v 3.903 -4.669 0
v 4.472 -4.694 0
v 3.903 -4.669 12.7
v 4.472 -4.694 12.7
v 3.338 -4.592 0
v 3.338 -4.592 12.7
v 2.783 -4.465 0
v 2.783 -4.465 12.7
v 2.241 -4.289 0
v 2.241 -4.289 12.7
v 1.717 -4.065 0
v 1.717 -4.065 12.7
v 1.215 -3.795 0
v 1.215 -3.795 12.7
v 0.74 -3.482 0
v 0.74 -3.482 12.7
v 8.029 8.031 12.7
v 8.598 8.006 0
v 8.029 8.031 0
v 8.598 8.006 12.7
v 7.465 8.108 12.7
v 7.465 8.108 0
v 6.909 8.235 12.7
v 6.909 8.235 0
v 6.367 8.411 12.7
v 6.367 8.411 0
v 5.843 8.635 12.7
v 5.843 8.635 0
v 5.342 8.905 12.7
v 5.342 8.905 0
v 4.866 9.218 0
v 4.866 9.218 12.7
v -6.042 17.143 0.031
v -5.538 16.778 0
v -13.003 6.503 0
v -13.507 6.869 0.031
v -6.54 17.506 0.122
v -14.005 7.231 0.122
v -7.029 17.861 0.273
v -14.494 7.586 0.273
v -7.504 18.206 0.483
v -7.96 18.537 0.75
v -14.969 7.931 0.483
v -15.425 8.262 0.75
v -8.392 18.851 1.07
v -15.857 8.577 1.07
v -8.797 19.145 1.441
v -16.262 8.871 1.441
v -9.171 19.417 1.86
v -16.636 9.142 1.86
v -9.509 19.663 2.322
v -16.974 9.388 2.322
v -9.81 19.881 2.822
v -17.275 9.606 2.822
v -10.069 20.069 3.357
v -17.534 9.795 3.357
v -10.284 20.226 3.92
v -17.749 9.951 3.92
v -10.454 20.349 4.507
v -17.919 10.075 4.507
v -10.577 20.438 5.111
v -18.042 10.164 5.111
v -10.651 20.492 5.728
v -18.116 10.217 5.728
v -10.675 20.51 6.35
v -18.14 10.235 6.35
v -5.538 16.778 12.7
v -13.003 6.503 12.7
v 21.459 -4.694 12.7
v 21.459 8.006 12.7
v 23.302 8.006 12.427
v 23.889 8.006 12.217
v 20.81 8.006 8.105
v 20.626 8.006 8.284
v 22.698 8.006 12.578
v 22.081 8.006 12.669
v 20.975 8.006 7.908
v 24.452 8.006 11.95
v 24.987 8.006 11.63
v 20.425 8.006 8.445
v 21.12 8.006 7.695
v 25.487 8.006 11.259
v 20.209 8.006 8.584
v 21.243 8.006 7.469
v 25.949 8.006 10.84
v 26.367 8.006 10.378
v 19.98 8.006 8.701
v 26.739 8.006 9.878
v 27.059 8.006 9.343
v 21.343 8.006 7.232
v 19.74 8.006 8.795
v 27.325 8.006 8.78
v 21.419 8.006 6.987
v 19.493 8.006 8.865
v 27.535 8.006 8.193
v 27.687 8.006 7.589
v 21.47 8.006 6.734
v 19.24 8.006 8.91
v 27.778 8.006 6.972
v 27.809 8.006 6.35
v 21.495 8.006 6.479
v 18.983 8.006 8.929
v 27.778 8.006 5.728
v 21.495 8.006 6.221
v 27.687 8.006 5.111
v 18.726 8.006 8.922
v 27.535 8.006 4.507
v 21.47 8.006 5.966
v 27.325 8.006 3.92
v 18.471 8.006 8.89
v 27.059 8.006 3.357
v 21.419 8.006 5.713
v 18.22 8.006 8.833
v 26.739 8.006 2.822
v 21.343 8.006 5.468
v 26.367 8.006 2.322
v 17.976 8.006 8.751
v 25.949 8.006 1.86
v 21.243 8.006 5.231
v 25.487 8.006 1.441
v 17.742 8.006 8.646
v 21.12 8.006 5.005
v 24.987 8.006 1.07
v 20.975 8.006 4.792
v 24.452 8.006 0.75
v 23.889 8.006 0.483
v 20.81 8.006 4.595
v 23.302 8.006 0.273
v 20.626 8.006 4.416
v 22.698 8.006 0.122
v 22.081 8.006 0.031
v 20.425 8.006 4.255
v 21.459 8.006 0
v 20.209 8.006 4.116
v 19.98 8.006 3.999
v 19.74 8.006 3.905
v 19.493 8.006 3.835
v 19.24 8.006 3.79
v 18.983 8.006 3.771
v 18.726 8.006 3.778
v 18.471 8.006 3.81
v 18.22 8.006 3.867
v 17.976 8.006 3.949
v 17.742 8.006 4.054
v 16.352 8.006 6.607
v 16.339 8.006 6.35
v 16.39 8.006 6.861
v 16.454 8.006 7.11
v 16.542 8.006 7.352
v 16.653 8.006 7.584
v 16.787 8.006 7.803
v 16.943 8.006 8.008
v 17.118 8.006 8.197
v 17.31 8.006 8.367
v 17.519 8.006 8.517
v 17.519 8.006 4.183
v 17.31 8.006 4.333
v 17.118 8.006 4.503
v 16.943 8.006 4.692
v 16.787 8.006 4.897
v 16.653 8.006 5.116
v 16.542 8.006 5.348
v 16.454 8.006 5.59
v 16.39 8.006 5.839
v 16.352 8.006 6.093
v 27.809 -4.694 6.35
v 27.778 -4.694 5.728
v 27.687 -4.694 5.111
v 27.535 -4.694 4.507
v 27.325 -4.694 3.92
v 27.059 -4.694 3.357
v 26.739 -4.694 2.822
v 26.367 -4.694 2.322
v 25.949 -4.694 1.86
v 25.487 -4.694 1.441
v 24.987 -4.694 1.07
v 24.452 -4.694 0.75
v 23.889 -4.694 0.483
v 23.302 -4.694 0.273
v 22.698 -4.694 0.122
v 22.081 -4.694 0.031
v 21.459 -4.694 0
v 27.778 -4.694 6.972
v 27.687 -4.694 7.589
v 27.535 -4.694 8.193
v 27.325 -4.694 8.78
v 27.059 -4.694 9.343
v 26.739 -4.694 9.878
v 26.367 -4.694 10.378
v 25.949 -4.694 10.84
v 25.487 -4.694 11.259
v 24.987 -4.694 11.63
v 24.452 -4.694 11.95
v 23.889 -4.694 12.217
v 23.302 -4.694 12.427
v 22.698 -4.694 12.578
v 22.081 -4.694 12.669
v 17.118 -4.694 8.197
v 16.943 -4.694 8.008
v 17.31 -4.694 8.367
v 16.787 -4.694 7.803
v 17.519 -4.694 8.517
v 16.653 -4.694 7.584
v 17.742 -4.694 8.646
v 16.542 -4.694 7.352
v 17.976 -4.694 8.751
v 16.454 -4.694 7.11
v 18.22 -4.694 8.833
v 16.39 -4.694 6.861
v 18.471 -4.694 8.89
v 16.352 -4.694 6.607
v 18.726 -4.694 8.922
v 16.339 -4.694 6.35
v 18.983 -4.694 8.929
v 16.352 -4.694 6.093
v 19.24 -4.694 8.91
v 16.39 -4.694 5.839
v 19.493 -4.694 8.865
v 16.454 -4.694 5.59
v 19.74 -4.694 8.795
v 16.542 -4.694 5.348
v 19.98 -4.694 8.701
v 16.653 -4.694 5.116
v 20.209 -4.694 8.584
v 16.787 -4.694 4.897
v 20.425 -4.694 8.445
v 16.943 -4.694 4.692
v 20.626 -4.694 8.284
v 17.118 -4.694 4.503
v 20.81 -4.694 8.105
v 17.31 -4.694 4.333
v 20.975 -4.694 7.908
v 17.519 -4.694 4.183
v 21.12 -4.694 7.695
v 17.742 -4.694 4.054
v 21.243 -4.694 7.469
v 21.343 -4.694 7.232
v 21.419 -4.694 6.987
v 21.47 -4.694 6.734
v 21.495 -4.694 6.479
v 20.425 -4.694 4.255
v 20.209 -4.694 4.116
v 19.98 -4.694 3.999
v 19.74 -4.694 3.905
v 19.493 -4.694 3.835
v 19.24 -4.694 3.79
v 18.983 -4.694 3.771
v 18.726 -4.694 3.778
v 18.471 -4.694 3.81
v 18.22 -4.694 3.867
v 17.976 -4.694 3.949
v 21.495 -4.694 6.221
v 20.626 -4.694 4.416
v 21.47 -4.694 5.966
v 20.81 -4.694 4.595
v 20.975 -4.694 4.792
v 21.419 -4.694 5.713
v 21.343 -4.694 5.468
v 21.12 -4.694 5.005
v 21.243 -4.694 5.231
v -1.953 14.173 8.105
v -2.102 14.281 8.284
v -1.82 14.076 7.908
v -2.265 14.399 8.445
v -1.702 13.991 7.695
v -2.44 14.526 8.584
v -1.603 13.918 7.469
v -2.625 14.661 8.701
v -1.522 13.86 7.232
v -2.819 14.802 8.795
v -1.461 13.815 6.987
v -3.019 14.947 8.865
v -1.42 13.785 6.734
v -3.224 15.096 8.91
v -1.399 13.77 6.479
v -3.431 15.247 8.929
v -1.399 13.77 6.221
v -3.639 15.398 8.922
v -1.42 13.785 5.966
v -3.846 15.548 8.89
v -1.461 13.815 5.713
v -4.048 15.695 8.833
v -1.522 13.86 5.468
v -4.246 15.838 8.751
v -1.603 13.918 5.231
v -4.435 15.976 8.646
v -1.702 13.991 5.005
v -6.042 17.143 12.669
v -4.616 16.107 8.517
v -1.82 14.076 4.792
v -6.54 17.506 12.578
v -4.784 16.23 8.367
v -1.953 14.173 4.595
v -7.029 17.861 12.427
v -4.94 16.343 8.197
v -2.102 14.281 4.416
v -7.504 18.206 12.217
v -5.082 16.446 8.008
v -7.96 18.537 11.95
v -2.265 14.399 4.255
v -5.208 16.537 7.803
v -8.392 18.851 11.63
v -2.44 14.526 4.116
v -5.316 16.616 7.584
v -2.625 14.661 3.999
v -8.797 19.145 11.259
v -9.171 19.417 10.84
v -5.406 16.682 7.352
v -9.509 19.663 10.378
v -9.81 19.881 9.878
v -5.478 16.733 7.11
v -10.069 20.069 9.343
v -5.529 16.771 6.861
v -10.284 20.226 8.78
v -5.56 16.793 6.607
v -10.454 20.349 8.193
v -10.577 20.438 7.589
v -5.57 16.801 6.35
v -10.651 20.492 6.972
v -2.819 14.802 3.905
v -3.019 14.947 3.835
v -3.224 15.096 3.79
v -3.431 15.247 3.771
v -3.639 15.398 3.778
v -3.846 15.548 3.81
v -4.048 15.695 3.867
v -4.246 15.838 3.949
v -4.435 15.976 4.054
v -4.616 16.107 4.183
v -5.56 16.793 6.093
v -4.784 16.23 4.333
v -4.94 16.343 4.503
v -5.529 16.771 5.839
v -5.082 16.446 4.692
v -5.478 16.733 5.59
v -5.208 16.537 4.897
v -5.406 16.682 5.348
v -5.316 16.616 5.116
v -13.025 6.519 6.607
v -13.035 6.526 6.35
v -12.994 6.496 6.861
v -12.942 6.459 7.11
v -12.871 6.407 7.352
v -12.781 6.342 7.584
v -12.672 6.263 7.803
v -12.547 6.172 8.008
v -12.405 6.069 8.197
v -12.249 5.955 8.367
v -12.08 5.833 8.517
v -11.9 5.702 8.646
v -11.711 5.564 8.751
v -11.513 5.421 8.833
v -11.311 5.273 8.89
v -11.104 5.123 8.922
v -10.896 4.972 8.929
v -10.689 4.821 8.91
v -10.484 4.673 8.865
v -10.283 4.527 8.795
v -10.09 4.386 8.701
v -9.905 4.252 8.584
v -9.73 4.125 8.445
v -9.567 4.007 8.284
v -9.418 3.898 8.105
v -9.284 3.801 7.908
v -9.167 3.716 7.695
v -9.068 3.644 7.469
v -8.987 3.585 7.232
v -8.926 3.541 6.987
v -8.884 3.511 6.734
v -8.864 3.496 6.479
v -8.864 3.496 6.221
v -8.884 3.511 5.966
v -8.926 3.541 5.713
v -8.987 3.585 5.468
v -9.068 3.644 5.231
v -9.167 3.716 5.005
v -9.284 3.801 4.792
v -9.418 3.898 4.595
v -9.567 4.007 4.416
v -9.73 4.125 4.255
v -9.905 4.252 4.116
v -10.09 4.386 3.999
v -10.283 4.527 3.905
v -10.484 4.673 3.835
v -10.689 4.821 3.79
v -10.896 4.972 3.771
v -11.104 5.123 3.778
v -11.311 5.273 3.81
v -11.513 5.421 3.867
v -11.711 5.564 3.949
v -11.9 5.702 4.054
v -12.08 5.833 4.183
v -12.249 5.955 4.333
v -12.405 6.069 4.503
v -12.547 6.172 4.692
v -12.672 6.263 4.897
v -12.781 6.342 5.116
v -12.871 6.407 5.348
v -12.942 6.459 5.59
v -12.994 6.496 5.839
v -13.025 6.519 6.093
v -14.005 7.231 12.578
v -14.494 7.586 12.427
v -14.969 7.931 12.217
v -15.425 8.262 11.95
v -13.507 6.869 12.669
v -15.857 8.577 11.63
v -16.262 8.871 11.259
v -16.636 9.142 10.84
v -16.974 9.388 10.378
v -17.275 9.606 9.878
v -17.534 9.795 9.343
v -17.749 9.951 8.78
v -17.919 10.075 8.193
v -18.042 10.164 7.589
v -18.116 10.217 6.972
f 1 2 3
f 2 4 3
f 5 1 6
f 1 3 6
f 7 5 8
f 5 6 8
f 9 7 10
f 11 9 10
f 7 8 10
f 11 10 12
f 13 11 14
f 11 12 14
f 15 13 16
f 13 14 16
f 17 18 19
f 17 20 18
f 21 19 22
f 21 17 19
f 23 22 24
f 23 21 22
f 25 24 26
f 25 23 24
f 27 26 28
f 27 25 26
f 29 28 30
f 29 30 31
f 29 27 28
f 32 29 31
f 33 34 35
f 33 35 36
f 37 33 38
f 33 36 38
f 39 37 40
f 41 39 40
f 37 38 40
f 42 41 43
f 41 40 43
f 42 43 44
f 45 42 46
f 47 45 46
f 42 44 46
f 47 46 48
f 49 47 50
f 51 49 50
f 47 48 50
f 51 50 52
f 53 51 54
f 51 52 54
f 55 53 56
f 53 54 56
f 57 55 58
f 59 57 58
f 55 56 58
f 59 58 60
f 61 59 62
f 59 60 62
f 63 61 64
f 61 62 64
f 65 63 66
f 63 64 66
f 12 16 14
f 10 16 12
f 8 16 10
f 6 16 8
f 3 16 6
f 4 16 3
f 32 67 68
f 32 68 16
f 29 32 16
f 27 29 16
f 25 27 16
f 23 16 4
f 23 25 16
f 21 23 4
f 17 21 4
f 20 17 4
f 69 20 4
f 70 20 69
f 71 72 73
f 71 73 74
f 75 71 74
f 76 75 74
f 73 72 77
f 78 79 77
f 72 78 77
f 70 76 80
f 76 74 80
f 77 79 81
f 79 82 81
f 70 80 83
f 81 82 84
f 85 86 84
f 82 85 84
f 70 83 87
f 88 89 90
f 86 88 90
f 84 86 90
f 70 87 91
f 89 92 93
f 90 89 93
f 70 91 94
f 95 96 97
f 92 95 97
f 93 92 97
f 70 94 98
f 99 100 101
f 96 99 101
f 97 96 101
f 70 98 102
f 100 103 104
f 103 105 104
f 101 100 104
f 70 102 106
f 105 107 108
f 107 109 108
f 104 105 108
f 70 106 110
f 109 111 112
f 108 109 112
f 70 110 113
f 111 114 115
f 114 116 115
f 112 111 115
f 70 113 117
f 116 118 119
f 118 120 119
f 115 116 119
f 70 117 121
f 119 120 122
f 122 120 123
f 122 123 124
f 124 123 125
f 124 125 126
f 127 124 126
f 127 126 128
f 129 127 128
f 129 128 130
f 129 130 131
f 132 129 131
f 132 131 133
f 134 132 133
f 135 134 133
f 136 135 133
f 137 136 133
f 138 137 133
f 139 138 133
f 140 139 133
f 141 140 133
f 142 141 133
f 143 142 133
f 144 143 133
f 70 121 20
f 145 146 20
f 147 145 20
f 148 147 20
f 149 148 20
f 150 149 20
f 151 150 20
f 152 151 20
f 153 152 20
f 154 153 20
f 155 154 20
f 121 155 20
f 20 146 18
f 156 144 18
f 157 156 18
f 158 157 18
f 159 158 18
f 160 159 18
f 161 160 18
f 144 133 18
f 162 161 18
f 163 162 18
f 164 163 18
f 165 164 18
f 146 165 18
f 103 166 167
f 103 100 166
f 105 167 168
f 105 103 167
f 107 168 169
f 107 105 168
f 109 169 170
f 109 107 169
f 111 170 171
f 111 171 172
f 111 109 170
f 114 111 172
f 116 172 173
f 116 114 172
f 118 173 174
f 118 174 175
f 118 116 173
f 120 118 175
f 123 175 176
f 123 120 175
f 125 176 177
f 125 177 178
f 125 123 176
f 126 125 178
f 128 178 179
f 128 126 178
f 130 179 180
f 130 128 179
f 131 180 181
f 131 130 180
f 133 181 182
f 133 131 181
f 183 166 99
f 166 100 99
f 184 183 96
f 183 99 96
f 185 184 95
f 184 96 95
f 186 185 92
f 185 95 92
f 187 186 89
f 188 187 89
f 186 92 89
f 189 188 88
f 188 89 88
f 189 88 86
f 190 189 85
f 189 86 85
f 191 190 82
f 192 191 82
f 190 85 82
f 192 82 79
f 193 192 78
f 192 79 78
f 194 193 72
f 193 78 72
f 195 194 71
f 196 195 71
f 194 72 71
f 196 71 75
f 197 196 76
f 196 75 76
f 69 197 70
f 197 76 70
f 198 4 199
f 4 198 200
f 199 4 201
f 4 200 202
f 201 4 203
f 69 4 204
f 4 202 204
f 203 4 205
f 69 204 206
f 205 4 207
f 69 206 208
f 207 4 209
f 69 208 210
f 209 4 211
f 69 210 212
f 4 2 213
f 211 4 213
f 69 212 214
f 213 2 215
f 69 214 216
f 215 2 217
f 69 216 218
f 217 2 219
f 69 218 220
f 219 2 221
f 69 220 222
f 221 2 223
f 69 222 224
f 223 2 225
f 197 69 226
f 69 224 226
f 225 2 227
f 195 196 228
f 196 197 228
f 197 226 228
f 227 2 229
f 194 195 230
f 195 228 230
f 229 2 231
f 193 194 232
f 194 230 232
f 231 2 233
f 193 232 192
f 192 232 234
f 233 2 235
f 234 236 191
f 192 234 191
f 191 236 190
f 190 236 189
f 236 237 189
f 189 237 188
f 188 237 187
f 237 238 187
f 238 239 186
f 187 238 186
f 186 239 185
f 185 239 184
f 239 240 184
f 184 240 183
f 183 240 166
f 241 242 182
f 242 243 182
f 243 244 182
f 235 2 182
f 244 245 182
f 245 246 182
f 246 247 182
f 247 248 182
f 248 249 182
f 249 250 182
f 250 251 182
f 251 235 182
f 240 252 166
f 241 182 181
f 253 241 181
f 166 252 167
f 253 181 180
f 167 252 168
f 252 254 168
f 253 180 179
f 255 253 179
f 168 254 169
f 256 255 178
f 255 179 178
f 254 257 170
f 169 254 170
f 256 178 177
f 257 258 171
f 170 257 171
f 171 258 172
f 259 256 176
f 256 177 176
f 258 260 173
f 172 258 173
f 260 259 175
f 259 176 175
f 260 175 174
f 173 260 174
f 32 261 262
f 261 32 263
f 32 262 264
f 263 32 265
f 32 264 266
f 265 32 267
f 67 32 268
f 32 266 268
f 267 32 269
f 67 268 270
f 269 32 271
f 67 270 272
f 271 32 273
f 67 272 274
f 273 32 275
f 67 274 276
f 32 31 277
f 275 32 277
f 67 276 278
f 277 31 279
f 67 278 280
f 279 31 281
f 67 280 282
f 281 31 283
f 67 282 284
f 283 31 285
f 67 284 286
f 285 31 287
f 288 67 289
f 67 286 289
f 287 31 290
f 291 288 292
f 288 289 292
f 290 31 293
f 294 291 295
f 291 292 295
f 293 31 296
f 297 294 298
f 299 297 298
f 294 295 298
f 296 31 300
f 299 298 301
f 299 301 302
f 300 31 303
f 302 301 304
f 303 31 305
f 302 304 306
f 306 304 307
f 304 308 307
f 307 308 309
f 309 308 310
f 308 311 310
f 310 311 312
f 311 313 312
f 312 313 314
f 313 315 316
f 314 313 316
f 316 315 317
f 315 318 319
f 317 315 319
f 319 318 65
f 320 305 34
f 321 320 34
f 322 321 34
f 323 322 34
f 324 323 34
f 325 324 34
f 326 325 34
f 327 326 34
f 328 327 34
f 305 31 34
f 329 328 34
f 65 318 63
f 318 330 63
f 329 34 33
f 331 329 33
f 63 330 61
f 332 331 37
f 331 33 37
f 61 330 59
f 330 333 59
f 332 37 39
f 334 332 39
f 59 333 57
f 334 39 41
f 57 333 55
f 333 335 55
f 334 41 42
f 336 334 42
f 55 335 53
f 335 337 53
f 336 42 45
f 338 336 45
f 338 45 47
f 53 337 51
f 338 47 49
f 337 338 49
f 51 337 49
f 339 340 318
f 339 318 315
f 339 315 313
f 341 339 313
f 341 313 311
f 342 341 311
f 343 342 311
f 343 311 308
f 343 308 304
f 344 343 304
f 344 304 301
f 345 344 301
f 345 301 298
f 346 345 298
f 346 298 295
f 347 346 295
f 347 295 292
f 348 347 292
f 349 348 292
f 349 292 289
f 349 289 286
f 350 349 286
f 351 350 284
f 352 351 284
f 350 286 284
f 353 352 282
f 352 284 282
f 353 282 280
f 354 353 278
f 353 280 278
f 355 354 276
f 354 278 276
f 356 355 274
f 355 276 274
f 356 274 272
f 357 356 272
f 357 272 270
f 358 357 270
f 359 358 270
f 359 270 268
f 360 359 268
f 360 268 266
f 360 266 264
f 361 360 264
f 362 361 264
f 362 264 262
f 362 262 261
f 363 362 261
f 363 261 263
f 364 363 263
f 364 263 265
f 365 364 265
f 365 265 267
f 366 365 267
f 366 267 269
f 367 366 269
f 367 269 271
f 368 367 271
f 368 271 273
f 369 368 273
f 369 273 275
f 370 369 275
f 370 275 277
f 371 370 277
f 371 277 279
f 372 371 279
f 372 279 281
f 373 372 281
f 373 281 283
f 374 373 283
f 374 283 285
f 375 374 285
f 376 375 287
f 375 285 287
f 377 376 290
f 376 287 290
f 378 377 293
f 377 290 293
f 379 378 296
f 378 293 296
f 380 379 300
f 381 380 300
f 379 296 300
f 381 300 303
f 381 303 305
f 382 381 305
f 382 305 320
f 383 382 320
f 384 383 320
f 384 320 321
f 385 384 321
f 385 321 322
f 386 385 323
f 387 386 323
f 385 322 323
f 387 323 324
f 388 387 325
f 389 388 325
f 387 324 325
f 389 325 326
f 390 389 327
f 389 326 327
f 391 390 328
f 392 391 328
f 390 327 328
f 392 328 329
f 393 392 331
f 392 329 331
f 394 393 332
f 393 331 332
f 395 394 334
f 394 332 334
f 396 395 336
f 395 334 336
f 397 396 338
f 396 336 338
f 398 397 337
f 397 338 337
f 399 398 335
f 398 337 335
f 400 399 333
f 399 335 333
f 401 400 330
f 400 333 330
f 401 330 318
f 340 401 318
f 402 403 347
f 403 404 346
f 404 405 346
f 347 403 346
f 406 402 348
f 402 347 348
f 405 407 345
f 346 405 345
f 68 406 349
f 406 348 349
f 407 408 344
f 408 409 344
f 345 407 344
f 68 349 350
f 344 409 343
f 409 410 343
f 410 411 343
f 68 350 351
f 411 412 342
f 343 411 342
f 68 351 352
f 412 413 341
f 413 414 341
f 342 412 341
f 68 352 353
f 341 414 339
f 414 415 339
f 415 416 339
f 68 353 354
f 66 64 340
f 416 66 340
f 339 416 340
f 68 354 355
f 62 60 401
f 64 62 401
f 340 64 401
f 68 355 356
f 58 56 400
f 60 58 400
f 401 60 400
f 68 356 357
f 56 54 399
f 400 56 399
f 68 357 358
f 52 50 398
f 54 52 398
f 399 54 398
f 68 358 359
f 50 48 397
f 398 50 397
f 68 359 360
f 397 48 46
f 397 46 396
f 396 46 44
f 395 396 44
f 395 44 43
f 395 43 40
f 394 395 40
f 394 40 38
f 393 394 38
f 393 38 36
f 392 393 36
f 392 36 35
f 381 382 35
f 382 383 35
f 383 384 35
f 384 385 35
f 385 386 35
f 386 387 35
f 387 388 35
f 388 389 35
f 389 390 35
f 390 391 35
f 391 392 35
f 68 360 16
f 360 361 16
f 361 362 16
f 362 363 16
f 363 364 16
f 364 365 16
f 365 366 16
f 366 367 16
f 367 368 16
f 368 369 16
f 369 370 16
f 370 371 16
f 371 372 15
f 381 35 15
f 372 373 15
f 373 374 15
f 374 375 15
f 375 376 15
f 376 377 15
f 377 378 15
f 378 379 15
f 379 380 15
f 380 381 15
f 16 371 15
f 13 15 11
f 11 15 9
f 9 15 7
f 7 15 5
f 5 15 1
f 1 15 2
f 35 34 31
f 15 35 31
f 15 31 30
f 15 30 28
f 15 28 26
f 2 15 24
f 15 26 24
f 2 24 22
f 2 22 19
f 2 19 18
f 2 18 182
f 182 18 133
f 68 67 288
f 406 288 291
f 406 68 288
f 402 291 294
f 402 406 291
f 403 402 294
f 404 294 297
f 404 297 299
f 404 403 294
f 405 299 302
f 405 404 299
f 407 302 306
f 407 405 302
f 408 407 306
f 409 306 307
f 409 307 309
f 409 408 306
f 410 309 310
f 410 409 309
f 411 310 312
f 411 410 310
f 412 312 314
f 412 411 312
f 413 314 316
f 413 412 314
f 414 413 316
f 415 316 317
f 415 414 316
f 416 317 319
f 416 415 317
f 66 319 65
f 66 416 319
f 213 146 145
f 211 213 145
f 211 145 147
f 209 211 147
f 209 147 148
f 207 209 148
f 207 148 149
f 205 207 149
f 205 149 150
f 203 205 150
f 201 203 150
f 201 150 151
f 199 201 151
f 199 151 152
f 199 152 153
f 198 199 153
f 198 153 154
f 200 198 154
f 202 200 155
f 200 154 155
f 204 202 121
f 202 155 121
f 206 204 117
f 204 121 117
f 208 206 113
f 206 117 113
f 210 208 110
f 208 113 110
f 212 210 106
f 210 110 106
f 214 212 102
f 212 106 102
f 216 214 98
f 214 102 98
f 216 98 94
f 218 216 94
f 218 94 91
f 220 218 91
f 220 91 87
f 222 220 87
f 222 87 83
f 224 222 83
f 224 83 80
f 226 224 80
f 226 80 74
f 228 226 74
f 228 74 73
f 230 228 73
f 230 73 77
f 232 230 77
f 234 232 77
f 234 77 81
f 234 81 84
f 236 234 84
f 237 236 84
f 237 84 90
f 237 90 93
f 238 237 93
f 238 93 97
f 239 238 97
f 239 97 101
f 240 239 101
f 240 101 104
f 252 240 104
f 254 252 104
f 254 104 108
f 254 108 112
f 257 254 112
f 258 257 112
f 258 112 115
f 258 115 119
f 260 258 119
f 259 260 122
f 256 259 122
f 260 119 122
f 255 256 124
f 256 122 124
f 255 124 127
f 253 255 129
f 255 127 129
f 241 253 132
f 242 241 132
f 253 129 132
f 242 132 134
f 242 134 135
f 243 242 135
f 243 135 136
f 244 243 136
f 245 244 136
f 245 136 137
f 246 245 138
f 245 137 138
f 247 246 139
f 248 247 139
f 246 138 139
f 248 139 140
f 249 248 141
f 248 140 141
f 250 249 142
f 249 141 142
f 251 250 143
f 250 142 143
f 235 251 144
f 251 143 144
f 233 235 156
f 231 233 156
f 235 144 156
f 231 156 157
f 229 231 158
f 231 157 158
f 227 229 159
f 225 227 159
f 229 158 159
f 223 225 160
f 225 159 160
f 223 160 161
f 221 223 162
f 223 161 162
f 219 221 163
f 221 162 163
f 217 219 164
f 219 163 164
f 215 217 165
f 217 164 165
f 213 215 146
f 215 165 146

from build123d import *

# Parameters (mm, degrees)
BOSS_EXTRUDE1_DEPTH = 12.7
SKETCH2_R           = 2.5796875
CUT_EXTRUDE1_DEPTH  = 26.162
SKETCH3_R           = 2.5796875
CUT_EXTRUDE2_DEPTH  = 26.162
FILLET1_R           = 6.35
FILLET2_R           = 6.35


with BuildPart() as part:
    # Sketch1 → Boss-Extrude1 (new body)
    with BuildSketch(Plane.XY):
        Polygon((27.808756526, 8.005672944), (6.535236668, 8.005672944), (-10.675402427, 20.509934181), (-18.140275131, 10.235418352), (2.408756526, -4.694327056), (27.808756526, -4.694327056), align=None)
    extrude(amount=BOSS_EXTRUDE1_DEPTH)

    # Sketch2 → Cut-Extrude1 (cut)
    with BuildSketch(Plane(origin=(0, 8.005672944, 0), x_dir=(1, 0, 0), z_dir=(0, 1, 0))):
        with Locations(Location((18.918756526, -6.35, 0), (0, 0, 180))):
            Circle(SKETCH2_R)
    extrude(amount=-CUT_EXTRUDE1_DEPTH, mode=Mode.SUBTRACT)

    # Sketch3 → Cut-Extrude2 (cut)
    with BuildSketch(Plane(origin=(6.064792448, 8.347470677, 0), x_dir=(0.809016994374947, -0.5877852522924737, 0), z_dir=(0.5877852522924737, 0.809016994374947, 0))):
        with Locations(Location((-11.802018822, -6.35, 0), (0, 0, 180))):
            Circle(SKETCH3_R)
    extrude(amount=-CUT_EXTRUDE2_DEPTH, mode=Mode.SUBTRACT)

    # Fillet1
    fillet1_edges = [part.edges().sort_by_distance(p)[0] for p in [
        (-14.407838779, 15.372676266, 0),
        (-14.407838779, 15.372676266, 12.7),
        (27.808756526, 1.655672944, 0),
        (27.808756526, 1.655672944, 12.7),
    ]]
    fillet(fillet1_edges, radius=FILLET1_R - 0.0001)  # a hair under: the kernel refuses the full size

    # Fillet2
    fillet2_edges = [part.edges().sort_by_distance(p)[0] for p in [
        (2.408756526, -4.694327056, 6.35),
        (6.535236668, 8.005672944, 6.35),
    ]]
    fillet(fillet2_edges, radius=FILLET2_R)


solid = part.part
